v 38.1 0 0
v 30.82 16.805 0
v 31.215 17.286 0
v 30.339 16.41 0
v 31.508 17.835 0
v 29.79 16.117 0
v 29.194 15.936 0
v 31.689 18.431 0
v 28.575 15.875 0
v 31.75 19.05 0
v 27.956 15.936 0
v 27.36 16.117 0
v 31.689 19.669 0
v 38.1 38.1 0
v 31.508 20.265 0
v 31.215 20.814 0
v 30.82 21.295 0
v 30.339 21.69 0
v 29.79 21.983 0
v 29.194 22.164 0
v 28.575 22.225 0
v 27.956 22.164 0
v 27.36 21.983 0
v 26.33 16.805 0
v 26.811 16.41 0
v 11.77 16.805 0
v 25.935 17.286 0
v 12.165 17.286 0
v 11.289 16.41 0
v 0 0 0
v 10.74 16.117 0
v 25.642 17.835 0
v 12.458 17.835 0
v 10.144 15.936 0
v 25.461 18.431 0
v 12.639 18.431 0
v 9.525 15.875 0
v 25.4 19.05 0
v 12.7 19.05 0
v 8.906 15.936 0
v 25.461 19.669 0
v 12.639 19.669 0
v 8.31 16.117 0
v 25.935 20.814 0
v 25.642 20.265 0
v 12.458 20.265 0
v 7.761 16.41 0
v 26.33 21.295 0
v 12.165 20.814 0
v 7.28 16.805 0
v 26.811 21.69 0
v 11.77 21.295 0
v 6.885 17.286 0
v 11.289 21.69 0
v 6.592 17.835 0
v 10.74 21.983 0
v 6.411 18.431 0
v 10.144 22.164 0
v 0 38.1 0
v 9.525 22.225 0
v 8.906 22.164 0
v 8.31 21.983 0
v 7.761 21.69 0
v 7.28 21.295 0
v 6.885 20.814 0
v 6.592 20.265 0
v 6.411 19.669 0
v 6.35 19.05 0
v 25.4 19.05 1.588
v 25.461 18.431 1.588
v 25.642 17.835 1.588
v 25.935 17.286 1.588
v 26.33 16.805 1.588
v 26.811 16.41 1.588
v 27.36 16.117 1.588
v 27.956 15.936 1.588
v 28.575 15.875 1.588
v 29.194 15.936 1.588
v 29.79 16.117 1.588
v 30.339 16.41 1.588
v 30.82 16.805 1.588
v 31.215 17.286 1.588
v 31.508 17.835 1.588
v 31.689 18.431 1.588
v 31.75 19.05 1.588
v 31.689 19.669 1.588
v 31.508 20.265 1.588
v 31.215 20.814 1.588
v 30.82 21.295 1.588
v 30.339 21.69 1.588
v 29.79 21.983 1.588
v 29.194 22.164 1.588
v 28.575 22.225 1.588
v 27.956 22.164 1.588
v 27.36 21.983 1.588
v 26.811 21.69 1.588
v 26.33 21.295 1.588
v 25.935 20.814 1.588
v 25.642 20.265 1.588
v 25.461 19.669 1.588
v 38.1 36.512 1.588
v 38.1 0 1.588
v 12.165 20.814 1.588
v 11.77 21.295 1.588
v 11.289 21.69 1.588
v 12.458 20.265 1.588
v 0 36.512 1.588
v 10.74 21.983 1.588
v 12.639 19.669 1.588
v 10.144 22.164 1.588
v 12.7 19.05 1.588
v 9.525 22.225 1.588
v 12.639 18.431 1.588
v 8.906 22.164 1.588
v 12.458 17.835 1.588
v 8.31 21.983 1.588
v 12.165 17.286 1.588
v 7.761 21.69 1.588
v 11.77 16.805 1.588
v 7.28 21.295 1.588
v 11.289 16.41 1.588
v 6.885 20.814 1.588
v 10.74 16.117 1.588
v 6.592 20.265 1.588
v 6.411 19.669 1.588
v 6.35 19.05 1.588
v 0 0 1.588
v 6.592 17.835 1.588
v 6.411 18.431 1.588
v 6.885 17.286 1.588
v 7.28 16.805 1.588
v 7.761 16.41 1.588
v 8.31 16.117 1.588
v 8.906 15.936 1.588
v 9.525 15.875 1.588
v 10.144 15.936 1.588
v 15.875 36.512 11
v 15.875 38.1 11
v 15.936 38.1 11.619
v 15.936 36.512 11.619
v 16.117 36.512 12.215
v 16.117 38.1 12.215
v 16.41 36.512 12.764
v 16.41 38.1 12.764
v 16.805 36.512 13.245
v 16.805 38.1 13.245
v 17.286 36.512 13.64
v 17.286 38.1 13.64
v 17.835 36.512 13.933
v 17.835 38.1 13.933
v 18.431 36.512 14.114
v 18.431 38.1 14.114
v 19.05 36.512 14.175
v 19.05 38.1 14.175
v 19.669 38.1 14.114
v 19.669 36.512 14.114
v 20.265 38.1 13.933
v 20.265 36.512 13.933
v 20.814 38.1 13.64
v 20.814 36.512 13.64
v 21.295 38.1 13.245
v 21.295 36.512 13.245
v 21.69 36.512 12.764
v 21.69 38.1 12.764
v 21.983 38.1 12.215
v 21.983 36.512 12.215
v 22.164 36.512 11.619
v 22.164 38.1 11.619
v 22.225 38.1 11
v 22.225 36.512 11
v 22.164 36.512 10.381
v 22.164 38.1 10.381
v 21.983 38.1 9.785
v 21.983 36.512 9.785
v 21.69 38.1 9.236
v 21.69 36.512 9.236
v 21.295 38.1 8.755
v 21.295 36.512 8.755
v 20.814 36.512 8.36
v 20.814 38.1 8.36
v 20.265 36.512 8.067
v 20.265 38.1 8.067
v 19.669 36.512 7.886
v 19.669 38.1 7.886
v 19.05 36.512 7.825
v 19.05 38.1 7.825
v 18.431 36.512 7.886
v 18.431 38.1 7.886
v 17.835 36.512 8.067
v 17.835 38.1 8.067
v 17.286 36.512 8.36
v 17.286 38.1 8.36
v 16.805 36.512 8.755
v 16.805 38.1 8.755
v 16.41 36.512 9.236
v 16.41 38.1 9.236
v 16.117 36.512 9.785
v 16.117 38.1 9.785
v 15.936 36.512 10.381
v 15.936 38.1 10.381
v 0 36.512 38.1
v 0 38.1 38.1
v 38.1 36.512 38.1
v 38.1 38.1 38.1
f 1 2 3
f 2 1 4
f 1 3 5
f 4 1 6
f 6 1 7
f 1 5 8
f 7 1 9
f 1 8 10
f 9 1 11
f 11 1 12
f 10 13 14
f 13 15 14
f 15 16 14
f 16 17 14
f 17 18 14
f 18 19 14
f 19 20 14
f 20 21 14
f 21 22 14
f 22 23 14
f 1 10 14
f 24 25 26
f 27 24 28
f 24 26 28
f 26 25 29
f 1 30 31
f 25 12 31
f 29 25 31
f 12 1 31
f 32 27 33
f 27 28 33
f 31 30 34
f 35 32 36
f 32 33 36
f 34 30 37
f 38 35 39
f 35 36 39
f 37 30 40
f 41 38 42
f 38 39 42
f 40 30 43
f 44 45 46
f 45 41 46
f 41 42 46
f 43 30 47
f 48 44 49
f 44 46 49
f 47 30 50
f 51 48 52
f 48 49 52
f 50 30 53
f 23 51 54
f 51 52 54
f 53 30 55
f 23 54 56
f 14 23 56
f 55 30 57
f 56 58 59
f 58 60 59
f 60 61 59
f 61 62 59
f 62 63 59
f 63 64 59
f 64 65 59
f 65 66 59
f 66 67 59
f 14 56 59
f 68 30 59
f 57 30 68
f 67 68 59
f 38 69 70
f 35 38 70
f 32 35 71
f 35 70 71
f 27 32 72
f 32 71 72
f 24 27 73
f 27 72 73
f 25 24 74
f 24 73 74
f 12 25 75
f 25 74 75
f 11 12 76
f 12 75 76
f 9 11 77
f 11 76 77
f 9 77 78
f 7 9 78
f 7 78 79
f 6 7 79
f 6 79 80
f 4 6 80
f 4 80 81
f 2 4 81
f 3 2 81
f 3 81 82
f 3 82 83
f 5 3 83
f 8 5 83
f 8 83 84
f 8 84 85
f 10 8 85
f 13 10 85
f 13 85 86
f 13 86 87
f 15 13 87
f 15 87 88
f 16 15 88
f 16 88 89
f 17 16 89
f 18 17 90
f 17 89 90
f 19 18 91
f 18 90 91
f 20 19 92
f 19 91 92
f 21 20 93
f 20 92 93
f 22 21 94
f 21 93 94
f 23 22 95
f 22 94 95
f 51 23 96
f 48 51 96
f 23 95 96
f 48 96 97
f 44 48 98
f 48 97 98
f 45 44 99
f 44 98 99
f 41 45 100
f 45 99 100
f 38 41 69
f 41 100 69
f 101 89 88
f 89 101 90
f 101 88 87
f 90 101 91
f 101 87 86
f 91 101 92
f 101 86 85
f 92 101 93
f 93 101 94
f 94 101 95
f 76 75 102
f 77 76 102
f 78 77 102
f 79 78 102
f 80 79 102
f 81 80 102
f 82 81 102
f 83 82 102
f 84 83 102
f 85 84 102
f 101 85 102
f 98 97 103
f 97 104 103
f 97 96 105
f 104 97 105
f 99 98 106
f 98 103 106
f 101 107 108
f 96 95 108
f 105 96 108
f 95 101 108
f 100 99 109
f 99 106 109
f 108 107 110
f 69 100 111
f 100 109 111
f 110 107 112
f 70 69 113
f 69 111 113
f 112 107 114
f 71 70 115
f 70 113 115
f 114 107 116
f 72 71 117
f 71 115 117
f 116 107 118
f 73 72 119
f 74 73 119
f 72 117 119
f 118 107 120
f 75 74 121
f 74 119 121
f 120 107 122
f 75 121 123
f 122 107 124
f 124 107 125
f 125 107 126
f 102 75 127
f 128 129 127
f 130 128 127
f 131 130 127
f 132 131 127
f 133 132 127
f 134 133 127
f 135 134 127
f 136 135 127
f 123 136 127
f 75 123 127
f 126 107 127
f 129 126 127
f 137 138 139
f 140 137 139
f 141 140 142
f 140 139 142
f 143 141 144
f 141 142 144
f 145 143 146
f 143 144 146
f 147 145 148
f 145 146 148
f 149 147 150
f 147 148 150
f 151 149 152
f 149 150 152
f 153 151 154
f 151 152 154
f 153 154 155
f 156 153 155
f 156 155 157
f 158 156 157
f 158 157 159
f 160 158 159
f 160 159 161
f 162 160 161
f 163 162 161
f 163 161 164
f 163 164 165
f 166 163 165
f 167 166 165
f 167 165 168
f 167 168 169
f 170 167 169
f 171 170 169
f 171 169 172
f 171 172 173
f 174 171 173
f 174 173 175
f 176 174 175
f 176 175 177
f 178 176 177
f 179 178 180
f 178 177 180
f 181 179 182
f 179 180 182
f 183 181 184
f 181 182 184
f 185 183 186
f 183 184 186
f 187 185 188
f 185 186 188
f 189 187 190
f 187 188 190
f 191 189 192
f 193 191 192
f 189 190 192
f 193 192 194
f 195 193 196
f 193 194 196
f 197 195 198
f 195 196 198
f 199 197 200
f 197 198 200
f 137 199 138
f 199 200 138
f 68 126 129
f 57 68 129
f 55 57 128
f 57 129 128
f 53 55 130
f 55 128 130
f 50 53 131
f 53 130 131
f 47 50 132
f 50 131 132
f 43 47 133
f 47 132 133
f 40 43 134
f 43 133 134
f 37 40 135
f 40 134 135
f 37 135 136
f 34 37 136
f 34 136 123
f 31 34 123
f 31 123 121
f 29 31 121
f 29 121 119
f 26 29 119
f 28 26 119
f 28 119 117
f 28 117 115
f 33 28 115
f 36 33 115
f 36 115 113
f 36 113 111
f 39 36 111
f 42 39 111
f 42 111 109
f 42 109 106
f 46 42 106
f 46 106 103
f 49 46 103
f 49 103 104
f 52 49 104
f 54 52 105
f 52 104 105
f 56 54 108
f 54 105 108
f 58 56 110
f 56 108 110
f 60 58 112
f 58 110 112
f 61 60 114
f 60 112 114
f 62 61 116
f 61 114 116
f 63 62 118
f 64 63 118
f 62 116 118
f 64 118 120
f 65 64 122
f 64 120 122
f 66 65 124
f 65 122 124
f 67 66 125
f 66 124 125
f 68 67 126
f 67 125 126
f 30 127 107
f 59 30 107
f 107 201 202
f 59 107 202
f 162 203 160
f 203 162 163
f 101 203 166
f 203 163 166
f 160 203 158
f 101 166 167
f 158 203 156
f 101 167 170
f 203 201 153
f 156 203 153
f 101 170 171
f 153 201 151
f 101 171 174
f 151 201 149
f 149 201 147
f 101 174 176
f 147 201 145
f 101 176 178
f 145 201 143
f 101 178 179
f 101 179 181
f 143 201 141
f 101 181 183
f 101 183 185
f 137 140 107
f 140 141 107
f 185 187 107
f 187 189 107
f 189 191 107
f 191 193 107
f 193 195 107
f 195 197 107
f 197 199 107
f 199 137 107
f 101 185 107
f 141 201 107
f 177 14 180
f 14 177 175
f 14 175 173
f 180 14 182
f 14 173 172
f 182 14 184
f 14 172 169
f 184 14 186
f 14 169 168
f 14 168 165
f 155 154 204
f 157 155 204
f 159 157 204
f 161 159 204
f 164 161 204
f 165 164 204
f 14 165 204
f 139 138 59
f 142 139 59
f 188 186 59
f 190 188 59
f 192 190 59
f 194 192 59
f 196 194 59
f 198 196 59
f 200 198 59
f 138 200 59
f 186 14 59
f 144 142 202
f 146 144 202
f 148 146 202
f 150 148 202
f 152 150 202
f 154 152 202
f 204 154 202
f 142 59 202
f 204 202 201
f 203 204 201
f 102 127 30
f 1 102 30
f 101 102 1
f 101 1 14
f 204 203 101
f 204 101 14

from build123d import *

# Parameters (mm, degrees)
F1_DEPTH = 38.1
F3_D     = 6.35
F5_D     = 6.35


with BuildPart() as f1:
    # F0 (on Right) → F1 (new body)
    with BuildSketch(Plane.YZ):
        Polygon((0, 1.5875), (0, 0), (38.1, 0), (38.1, 1.5875), (38.1, 38.1), (36.5125, 38.1), (36.5125, 1.5875), align=None)
    extrude(amount=F1_DEPTH)

    # F3 (through all)
    with Locations(Plane.XZ.offset(-36.5125)):
        with Locations((19.05, 11)):
            Hole(F3_D / 2)

    # F5 (through all)
    with Locations(Plane(origin=(0, 0, 0), x_dir=(1, 0, 0), z_dir=(0, 0, -1))):
        with Locations((9.525, -19.05), (28.575, -19.05)):
            Hole(F5_D / 2)


solid = f1.part
